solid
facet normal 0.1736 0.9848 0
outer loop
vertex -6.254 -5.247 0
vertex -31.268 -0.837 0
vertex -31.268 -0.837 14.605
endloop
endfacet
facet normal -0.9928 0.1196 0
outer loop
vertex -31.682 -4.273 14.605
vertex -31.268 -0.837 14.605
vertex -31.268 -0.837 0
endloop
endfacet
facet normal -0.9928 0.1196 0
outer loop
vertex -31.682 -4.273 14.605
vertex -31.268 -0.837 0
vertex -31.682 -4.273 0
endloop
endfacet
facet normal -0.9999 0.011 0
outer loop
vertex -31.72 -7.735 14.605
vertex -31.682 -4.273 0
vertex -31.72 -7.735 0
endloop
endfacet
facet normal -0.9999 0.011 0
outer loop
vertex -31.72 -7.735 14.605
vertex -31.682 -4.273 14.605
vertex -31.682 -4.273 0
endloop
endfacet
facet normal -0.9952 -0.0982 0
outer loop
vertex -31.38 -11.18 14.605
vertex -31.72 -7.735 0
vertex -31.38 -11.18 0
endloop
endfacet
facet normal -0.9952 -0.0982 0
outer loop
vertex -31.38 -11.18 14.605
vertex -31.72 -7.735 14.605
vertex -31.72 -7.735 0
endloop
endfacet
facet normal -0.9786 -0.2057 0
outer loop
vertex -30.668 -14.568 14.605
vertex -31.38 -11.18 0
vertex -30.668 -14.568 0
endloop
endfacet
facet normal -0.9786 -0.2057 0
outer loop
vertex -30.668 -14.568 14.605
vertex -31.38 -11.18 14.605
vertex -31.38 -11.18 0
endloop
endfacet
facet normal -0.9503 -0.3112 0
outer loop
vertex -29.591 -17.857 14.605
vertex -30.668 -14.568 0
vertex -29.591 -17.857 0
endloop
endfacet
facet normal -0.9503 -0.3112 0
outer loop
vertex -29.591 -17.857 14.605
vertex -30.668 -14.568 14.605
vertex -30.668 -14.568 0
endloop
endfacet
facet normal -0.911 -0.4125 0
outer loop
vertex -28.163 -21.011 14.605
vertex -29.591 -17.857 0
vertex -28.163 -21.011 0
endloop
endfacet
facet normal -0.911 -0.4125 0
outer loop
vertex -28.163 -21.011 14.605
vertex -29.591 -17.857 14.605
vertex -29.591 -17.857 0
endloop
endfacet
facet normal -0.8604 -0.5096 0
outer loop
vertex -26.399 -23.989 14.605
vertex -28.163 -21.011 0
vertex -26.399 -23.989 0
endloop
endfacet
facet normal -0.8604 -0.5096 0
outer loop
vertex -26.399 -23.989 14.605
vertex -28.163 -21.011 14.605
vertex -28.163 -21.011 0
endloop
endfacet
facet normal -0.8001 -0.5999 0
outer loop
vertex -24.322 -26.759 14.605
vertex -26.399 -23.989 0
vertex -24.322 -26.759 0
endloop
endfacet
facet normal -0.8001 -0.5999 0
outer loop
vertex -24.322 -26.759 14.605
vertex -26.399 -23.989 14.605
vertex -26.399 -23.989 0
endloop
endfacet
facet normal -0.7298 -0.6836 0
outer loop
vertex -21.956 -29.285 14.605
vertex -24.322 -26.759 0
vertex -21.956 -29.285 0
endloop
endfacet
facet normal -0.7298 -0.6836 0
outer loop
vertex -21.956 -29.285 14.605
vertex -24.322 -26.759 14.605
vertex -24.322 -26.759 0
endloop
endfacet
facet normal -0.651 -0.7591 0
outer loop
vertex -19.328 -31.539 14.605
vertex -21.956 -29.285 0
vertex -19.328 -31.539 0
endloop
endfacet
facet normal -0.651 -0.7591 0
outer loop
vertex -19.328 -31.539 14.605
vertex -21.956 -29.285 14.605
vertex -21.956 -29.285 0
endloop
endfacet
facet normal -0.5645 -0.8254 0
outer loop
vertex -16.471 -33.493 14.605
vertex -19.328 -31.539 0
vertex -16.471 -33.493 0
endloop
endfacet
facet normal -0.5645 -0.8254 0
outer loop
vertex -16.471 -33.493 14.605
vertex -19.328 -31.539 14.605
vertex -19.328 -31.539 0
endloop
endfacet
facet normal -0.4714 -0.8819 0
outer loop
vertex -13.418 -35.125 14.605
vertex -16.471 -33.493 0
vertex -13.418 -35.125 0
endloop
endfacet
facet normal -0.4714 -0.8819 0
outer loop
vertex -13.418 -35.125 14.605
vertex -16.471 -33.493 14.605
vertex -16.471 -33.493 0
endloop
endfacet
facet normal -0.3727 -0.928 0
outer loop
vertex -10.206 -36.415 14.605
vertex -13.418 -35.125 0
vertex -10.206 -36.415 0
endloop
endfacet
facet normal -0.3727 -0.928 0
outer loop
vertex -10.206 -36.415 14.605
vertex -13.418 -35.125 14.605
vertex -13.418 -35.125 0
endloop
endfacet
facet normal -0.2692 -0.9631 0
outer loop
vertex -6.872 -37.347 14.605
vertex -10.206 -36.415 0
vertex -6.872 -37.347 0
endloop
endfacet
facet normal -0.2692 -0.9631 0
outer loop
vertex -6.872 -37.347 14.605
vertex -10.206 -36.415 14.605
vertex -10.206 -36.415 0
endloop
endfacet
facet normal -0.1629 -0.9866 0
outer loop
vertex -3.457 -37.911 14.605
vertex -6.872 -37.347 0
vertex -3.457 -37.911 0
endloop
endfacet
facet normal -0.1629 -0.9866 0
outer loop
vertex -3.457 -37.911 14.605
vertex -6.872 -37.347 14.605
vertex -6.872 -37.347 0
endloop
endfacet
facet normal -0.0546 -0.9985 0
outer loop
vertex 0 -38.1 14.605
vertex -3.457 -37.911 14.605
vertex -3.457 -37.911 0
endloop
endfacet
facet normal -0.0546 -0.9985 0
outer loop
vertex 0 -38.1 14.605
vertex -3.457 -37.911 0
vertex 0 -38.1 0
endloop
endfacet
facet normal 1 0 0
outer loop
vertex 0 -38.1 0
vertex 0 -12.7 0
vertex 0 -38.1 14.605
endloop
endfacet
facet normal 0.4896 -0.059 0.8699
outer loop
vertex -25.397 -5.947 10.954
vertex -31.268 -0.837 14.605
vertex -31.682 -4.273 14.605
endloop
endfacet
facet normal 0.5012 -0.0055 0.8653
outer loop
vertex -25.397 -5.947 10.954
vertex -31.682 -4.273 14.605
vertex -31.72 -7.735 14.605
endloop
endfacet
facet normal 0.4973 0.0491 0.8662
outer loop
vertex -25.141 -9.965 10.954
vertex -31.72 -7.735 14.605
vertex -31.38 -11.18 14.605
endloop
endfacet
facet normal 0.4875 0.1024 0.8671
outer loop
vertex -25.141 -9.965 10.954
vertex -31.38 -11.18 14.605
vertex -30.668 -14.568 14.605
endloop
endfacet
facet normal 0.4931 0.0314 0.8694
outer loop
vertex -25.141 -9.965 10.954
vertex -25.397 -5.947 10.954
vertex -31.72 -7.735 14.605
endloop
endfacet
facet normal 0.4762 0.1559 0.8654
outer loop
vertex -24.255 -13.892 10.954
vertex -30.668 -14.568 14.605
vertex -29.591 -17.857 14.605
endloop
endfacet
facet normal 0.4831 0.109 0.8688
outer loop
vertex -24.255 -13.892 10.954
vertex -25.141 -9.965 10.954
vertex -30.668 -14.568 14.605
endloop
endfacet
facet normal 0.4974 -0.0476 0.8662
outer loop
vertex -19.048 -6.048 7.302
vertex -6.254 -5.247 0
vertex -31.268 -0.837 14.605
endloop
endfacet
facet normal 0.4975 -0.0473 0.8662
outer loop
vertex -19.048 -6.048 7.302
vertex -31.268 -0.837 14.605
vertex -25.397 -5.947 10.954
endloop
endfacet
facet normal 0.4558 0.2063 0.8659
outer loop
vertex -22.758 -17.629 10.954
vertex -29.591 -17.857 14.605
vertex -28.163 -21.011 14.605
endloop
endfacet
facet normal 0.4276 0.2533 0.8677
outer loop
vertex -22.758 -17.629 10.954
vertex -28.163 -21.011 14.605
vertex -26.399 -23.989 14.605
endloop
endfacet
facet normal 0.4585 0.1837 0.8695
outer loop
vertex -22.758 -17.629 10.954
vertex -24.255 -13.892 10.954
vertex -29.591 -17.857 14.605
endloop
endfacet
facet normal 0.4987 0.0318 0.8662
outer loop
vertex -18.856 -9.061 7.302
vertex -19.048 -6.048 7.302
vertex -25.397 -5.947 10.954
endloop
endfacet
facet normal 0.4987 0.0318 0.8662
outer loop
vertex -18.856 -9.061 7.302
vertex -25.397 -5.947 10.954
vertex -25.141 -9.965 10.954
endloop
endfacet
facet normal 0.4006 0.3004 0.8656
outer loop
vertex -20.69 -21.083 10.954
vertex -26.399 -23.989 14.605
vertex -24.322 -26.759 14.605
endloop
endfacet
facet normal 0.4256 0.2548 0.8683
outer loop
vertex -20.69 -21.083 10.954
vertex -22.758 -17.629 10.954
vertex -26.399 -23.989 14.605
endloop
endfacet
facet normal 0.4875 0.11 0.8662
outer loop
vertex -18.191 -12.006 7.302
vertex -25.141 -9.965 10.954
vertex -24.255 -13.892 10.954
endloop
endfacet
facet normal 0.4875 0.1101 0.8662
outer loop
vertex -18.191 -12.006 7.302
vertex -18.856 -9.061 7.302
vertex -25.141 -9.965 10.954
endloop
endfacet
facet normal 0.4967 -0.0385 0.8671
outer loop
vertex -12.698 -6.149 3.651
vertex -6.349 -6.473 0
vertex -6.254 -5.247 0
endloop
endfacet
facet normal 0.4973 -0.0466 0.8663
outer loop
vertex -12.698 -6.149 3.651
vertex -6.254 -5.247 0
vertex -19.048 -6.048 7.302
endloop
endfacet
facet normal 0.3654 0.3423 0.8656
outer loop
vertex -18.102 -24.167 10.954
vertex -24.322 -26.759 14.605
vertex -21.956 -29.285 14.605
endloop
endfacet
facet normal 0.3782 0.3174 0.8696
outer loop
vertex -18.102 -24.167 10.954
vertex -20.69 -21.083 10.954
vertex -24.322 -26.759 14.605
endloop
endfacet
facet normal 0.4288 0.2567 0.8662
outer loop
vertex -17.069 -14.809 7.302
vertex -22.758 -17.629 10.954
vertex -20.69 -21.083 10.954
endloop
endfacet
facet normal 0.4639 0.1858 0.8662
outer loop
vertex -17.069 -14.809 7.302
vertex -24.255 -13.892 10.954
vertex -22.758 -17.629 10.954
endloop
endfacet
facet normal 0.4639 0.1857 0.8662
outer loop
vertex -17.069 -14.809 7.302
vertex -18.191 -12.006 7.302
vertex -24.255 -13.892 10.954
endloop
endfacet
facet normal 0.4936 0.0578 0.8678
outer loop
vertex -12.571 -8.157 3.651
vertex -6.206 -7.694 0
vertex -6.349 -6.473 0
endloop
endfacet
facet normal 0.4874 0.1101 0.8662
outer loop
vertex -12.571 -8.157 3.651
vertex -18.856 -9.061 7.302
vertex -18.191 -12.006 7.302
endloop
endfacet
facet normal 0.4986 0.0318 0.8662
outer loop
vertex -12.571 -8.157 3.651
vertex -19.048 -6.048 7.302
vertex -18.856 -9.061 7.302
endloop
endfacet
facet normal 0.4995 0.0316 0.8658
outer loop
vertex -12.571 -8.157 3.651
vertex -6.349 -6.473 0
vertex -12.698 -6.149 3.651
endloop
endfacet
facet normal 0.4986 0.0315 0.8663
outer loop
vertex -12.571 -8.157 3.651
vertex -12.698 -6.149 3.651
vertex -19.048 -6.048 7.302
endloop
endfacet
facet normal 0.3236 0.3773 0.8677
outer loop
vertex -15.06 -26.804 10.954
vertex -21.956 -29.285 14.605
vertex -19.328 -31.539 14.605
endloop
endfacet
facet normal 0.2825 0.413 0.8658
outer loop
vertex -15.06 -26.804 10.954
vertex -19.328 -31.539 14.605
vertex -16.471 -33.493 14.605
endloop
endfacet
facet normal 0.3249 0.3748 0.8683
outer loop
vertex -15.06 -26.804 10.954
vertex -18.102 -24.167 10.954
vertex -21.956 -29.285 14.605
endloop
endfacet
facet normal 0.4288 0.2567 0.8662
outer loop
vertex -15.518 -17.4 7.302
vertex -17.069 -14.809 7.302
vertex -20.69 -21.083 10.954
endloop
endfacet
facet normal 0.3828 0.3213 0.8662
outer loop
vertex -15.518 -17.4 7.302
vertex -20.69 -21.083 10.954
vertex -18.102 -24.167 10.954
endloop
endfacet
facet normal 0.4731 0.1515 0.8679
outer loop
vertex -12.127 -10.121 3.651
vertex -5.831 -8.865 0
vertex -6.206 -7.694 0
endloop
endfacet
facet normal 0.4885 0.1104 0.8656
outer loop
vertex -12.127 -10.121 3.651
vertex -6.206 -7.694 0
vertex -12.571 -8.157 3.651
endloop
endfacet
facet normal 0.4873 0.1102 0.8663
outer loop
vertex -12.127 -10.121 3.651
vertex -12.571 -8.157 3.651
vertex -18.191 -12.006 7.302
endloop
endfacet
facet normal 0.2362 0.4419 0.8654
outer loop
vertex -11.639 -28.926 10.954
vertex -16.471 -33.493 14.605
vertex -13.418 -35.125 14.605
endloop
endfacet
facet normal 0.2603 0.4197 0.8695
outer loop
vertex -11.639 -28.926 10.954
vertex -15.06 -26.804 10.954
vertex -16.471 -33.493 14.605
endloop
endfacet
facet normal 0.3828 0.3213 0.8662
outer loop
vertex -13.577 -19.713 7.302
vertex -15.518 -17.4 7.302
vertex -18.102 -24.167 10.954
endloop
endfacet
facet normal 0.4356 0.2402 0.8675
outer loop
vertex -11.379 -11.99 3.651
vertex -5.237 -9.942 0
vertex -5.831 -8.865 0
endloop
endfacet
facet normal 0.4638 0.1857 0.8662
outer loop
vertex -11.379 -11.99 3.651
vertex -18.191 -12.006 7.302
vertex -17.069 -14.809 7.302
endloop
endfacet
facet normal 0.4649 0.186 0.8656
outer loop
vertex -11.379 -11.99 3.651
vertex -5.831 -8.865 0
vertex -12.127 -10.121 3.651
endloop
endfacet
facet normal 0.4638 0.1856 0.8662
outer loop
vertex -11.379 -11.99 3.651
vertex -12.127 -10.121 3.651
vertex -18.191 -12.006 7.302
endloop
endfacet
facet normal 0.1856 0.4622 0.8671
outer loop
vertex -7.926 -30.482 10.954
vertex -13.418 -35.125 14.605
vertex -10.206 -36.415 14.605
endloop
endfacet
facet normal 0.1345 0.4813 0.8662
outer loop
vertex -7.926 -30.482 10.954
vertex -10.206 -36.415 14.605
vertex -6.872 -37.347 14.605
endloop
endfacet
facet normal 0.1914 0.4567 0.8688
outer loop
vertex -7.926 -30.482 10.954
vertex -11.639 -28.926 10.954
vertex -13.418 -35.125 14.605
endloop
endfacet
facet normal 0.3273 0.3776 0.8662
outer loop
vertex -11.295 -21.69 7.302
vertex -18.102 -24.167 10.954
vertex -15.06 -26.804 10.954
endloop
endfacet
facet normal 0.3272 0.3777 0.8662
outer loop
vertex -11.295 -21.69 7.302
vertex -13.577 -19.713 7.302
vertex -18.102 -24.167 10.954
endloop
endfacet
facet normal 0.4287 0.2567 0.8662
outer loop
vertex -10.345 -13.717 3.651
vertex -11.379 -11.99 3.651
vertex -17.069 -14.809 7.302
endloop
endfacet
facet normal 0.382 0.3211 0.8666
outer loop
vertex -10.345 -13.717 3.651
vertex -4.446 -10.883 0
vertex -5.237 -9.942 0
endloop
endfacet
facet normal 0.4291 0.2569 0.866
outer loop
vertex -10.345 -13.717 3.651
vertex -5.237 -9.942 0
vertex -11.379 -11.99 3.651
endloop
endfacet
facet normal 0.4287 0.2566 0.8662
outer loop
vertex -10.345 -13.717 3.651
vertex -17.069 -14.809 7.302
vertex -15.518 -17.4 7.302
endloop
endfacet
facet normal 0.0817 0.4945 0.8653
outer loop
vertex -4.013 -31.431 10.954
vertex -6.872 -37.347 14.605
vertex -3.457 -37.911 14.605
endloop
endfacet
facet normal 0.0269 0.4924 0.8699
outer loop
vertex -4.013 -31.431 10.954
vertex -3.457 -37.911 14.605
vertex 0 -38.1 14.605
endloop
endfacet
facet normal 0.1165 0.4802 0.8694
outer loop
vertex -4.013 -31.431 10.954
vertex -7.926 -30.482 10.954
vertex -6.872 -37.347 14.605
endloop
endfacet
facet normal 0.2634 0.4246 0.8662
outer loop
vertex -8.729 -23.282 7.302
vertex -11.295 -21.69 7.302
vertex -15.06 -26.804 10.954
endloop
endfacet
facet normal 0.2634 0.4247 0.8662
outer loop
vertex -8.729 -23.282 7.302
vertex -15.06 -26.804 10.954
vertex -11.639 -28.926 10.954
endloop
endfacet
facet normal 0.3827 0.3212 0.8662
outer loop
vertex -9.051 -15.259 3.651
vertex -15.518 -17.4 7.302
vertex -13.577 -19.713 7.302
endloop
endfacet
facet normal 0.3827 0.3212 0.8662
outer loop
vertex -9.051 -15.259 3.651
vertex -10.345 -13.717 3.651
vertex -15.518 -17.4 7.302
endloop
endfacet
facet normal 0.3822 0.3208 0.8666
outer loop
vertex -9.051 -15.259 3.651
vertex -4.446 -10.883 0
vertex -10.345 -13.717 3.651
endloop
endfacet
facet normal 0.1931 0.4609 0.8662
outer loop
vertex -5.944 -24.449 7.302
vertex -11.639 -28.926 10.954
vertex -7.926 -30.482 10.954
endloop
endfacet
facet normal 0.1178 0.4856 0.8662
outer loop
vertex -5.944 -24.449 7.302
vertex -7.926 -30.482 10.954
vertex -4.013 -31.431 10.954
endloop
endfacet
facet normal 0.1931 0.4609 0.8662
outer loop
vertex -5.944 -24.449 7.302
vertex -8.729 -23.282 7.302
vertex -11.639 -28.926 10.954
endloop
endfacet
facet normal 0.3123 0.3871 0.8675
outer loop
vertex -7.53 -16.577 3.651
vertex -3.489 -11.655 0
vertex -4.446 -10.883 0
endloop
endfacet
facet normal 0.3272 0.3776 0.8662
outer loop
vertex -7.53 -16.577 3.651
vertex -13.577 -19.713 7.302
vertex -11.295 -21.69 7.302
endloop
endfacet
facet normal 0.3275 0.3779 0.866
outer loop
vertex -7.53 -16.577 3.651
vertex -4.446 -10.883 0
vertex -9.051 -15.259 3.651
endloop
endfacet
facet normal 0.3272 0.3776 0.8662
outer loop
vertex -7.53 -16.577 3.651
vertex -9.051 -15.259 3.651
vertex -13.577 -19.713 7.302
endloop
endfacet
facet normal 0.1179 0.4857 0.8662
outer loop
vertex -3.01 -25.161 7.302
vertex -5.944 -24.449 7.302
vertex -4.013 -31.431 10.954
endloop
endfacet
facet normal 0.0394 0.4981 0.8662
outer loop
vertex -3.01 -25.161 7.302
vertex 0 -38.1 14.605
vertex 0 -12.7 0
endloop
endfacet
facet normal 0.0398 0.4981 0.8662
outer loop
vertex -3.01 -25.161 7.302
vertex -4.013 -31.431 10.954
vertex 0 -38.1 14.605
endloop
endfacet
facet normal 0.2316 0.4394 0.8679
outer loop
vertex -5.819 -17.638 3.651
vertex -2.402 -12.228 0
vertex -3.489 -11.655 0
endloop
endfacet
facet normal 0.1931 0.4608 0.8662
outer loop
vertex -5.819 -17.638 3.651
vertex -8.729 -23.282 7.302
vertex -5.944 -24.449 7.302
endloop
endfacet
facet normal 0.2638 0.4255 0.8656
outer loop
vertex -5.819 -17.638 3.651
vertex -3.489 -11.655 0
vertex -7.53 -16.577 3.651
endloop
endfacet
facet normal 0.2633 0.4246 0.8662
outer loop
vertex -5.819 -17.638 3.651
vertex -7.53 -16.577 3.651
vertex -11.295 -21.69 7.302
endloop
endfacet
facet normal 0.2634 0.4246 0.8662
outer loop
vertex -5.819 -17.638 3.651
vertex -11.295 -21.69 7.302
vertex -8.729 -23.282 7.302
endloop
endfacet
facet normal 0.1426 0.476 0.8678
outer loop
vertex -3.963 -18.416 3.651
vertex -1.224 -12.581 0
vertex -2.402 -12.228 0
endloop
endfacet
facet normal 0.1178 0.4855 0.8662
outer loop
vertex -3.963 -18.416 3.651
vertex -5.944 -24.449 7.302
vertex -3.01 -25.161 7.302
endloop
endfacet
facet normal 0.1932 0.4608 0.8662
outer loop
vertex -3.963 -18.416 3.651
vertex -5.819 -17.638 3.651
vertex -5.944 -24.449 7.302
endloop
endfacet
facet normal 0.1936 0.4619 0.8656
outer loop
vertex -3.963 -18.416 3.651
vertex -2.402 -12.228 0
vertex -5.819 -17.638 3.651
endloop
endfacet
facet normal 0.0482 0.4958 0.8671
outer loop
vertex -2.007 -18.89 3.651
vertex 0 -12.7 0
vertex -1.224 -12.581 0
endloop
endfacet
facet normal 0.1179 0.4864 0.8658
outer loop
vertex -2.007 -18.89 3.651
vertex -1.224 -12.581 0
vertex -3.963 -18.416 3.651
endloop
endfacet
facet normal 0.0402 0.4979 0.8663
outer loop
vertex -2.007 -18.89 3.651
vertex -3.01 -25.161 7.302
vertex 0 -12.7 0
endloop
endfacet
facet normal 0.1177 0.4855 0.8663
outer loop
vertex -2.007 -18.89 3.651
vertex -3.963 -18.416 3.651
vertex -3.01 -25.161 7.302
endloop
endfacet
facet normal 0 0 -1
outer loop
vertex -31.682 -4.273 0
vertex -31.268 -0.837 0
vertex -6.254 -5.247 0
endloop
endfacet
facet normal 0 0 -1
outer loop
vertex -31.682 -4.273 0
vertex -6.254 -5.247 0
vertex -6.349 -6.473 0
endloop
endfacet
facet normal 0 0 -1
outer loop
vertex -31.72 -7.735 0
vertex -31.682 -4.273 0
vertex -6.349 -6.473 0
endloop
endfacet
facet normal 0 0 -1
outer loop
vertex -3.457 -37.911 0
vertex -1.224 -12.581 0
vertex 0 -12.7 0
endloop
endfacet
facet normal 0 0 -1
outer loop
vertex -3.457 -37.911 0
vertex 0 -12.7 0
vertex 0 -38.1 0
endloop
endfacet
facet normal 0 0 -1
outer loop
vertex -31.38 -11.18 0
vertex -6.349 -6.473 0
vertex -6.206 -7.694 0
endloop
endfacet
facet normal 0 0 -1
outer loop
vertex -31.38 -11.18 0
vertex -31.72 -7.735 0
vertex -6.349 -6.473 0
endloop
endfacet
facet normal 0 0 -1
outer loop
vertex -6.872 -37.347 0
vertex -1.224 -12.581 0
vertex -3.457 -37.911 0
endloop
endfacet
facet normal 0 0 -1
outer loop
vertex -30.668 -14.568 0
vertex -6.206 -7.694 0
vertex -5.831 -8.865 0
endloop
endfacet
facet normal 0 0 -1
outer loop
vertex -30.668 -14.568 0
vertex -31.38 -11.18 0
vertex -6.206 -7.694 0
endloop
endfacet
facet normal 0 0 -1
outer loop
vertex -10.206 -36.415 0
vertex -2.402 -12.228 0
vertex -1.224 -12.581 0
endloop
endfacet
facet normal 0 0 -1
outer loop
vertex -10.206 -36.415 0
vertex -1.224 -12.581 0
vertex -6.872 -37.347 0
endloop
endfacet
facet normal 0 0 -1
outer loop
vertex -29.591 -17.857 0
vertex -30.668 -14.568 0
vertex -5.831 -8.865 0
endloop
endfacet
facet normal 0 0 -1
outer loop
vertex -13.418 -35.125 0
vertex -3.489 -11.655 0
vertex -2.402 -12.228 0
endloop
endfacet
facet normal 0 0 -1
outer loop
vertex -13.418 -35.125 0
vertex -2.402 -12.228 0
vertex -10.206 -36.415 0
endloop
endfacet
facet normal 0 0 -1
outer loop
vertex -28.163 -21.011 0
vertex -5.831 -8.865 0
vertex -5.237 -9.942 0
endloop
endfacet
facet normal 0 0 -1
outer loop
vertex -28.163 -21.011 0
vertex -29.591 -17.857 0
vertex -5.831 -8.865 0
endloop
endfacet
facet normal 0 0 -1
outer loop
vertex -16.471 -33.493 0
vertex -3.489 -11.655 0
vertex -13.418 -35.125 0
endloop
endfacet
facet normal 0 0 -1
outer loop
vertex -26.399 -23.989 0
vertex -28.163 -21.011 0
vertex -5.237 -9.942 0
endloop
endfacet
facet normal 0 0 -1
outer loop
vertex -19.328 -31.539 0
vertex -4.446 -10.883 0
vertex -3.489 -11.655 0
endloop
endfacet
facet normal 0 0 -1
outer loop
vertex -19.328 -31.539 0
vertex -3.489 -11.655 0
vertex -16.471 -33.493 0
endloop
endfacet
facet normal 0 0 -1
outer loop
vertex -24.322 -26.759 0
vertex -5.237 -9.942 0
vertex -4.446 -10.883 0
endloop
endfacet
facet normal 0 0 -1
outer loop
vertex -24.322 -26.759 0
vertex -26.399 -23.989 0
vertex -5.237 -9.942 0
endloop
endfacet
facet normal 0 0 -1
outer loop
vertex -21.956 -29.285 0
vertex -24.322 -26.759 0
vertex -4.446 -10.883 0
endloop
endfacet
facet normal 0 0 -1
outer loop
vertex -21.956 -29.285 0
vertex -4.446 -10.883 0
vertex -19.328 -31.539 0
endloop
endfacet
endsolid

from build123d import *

# Parameters (mm, degrees)
F3_DEPTH = 14.606
F5_DEPTH = 14.606


with BuildPart() as f1:
    # F0 (on Right) → F1 (revolve)
    with BuildSketch(Plane.YZ):
        Polygon((25.4, 14.605), (0, 0), (25.4, 0), align=None)
    revolve(axis=Axis((0, -6.35, 8.989026), (0, 0, 1)))

    # F2 (on Top) → F3 (cut, through all)
    with BuildSketch(Plane.XY):
        Polygon((0, 31.75), (0, -6.35), (0, -41.735239), (38.1, -41.735239), (38.1, -6.35), (38.1, 31.75), align=None)
        Polygon((-6.718058, 31.75), (0, -6.35), (0, 31.75), align=None)
    extrude(amount=F3_DEPTH, mode=Mode.SUBTRACT)

    # F4 (on Top) → F5 (cut, through all)
    with BuildSketch(Plane.XY):
        Polygon((0, -6.35), (0, 27.06758), (-38.1, 27.06758), (-38.1, 0.368058), align=None)
    extrude(amount=F5_DEPTH, mode=Mode.SUBTRACT)


solid = f1.part
